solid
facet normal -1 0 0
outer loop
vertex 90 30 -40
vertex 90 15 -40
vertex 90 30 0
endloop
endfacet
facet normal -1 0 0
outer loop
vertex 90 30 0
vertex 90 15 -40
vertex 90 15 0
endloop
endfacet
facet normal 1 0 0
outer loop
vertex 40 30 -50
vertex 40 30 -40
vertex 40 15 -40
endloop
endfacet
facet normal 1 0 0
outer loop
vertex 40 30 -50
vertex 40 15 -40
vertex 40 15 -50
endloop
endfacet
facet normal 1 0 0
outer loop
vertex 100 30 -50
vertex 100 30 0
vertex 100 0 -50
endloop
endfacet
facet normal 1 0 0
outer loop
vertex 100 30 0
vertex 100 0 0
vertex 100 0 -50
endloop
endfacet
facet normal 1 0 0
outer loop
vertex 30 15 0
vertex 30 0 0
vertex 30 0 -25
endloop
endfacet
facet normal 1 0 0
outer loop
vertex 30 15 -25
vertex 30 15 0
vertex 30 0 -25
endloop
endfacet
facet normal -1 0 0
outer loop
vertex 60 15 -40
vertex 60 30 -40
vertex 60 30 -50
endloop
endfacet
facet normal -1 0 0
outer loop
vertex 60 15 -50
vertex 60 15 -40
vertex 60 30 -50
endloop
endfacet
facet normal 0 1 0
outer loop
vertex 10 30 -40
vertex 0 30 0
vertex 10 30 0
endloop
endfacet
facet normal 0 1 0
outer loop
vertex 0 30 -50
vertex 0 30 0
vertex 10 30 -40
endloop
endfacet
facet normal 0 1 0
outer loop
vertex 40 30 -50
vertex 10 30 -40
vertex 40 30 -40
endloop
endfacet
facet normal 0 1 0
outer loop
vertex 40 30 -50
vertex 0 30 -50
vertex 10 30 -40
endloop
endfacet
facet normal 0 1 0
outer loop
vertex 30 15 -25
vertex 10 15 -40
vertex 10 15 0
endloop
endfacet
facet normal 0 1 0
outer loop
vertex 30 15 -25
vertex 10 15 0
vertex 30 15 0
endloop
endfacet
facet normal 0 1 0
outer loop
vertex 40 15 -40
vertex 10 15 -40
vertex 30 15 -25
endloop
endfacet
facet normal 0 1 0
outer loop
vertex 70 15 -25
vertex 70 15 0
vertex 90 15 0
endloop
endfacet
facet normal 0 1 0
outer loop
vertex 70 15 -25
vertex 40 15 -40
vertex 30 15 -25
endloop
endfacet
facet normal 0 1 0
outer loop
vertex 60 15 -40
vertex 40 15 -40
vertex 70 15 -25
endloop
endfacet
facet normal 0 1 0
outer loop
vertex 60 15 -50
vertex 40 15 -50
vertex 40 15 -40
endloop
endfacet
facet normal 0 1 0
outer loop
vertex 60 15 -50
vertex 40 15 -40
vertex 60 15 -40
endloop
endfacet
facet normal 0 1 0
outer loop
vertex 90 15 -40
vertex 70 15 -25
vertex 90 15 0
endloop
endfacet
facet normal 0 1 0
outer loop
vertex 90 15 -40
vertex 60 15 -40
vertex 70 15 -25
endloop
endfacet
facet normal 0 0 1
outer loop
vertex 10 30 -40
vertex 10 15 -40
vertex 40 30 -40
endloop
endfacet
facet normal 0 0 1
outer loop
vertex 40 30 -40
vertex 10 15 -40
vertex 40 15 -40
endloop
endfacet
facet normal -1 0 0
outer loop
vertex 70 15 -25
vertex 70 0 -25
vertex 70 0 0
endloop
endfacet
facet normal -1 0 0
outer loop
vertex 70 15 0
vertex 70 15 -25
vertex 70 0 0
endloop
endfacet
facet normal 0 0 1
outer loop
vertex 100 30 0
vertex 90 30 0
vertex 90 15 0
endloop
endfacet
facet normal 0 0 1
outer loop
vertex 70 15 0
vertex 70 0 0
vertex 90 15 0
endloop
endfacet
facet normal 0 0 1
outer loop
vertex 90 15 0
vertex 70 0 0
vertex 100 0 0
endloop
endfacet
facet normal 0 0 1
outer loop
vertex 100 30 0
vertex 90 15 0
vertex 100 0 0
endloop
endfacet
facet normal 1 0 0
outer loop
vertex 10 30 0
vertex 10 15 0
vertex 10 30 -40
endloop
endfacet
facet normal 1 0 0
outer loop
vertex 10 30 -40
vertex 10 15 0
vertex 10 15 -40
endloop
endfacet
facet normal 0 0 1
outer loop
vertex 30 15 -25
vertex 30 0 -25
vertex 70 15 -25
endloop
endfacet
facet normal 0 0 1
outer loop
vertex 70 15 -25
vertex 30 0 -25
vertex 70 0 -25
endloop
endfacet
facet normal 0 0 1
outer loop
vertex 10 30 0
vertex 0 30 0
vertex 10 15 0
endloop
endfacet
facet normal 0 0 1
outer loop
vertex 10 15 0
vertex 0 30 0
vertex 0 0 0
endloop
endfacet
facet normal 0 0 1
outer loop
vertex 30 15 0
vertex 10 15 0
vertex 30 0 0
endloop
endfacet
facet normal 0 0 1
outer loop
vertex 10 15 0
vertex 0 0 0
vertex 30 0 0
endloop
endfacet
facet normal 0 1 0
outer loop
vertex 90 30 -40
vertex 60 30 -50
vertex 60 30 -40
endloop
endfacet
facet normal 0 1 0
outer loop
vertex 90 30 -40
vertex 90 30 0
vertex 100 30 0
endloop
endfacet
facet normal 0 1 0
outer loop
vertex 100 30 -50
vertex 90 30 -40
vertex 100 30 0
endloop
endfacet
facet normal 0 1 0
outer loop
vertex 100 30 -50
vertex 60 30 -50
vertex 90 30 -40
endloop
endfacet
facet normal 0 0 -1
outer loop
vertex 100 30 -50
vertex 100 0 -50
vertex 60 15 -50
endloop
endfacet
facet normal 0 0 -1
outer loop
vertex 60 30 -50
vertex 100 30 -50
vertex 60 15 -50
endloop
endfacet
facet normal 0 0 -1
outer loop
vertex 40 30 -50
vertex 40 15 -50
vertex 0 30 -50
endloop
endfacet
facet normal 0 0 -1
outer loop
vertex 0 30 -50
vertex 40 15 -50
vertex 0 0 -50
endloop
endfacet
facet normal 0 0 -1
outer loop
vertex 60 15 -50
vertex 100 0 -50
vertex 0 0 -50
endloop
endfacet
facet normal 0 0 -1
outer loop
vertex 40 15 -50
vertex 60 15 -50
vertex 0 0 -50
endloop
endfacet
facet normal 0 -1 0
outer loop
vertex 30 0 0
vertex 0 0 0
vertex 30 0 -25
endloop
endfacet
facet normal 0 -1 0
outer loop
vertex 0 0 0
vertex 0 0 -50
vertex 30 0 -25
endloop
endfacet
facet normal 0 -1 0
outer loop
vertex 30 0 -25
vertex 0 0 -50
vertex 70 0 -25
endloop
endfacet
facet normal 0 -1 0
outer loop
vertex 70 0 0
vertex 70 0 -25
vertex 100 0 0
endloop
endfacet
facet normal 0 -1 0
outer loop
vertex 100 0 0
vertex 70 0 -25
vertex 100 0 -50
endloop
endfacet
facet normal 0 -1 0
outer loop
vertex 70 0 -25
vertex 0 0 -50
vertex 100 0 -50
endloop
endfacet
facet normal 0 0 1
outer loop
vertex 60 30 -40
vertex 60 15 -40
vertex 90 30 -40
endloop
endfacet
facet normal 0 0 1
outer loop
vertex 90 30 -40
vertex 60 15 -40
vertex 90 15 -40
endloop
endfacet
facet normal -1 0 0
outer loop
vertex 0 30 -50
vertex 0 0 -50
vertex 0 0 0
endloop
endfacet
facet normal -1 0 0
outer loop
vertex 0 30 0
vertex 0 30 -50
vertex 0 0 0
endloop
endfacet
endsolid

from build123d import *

# Parameters (mm, degrees)
BOSS_EXTRUDE1_DEPTH = 15
BOSS_EXTRUDE2_DEPTH = 15
SKETCH3_W           = 20
SKETCH3_H           = 10
CUT_EXTRUDE1_DEPTH  = 15


with BuildPart() as part:
    # Sketch1 → Boss-Extrude1 (new body)
    with BuildSketch(Plane(origin=(0, 0, 0), x_dir=(1, 0, 0), z_dir=(0, 1, 0))):
        Polygon((0, 0), (30, 0), (30, 25), (70, 25), (70, 0), (100, 0), (100, 50), (0, 50), align=None)
    extrude(amount=BOSS_EXTRUDE1_DEPTH)

    # Sketch2 → Boss-Extrude2 (add)
    with BuildSketch(Plane(origin=(0, 15, 0), x_dir=(1, 0, 0), z_dir=(0, 1, 0))):
        Polygon((0, 0), (10, 0), (10, 40), (90, 40), (90, 0), (100, 0), (100, 50), (0, 50), align=None)
    extrude(amount=BOSS_EXTRUDE2_DEPTH)

    # Sketch3 → Cut-Extrude1 (cut)
    with BuildSketch(Plane(origin=(0, 30, 0), x_dir=(1, 0, 0), z_dir=(0, 1, 0))):
        with Locations((50, 45)):
            Rectangle(SKETCH3_W, SKETCH3_H)
    extrude(amount=-CUT_EXTRUDE1_DEPTH, mode=Mode.SUBTRACT)


solid = part.part
